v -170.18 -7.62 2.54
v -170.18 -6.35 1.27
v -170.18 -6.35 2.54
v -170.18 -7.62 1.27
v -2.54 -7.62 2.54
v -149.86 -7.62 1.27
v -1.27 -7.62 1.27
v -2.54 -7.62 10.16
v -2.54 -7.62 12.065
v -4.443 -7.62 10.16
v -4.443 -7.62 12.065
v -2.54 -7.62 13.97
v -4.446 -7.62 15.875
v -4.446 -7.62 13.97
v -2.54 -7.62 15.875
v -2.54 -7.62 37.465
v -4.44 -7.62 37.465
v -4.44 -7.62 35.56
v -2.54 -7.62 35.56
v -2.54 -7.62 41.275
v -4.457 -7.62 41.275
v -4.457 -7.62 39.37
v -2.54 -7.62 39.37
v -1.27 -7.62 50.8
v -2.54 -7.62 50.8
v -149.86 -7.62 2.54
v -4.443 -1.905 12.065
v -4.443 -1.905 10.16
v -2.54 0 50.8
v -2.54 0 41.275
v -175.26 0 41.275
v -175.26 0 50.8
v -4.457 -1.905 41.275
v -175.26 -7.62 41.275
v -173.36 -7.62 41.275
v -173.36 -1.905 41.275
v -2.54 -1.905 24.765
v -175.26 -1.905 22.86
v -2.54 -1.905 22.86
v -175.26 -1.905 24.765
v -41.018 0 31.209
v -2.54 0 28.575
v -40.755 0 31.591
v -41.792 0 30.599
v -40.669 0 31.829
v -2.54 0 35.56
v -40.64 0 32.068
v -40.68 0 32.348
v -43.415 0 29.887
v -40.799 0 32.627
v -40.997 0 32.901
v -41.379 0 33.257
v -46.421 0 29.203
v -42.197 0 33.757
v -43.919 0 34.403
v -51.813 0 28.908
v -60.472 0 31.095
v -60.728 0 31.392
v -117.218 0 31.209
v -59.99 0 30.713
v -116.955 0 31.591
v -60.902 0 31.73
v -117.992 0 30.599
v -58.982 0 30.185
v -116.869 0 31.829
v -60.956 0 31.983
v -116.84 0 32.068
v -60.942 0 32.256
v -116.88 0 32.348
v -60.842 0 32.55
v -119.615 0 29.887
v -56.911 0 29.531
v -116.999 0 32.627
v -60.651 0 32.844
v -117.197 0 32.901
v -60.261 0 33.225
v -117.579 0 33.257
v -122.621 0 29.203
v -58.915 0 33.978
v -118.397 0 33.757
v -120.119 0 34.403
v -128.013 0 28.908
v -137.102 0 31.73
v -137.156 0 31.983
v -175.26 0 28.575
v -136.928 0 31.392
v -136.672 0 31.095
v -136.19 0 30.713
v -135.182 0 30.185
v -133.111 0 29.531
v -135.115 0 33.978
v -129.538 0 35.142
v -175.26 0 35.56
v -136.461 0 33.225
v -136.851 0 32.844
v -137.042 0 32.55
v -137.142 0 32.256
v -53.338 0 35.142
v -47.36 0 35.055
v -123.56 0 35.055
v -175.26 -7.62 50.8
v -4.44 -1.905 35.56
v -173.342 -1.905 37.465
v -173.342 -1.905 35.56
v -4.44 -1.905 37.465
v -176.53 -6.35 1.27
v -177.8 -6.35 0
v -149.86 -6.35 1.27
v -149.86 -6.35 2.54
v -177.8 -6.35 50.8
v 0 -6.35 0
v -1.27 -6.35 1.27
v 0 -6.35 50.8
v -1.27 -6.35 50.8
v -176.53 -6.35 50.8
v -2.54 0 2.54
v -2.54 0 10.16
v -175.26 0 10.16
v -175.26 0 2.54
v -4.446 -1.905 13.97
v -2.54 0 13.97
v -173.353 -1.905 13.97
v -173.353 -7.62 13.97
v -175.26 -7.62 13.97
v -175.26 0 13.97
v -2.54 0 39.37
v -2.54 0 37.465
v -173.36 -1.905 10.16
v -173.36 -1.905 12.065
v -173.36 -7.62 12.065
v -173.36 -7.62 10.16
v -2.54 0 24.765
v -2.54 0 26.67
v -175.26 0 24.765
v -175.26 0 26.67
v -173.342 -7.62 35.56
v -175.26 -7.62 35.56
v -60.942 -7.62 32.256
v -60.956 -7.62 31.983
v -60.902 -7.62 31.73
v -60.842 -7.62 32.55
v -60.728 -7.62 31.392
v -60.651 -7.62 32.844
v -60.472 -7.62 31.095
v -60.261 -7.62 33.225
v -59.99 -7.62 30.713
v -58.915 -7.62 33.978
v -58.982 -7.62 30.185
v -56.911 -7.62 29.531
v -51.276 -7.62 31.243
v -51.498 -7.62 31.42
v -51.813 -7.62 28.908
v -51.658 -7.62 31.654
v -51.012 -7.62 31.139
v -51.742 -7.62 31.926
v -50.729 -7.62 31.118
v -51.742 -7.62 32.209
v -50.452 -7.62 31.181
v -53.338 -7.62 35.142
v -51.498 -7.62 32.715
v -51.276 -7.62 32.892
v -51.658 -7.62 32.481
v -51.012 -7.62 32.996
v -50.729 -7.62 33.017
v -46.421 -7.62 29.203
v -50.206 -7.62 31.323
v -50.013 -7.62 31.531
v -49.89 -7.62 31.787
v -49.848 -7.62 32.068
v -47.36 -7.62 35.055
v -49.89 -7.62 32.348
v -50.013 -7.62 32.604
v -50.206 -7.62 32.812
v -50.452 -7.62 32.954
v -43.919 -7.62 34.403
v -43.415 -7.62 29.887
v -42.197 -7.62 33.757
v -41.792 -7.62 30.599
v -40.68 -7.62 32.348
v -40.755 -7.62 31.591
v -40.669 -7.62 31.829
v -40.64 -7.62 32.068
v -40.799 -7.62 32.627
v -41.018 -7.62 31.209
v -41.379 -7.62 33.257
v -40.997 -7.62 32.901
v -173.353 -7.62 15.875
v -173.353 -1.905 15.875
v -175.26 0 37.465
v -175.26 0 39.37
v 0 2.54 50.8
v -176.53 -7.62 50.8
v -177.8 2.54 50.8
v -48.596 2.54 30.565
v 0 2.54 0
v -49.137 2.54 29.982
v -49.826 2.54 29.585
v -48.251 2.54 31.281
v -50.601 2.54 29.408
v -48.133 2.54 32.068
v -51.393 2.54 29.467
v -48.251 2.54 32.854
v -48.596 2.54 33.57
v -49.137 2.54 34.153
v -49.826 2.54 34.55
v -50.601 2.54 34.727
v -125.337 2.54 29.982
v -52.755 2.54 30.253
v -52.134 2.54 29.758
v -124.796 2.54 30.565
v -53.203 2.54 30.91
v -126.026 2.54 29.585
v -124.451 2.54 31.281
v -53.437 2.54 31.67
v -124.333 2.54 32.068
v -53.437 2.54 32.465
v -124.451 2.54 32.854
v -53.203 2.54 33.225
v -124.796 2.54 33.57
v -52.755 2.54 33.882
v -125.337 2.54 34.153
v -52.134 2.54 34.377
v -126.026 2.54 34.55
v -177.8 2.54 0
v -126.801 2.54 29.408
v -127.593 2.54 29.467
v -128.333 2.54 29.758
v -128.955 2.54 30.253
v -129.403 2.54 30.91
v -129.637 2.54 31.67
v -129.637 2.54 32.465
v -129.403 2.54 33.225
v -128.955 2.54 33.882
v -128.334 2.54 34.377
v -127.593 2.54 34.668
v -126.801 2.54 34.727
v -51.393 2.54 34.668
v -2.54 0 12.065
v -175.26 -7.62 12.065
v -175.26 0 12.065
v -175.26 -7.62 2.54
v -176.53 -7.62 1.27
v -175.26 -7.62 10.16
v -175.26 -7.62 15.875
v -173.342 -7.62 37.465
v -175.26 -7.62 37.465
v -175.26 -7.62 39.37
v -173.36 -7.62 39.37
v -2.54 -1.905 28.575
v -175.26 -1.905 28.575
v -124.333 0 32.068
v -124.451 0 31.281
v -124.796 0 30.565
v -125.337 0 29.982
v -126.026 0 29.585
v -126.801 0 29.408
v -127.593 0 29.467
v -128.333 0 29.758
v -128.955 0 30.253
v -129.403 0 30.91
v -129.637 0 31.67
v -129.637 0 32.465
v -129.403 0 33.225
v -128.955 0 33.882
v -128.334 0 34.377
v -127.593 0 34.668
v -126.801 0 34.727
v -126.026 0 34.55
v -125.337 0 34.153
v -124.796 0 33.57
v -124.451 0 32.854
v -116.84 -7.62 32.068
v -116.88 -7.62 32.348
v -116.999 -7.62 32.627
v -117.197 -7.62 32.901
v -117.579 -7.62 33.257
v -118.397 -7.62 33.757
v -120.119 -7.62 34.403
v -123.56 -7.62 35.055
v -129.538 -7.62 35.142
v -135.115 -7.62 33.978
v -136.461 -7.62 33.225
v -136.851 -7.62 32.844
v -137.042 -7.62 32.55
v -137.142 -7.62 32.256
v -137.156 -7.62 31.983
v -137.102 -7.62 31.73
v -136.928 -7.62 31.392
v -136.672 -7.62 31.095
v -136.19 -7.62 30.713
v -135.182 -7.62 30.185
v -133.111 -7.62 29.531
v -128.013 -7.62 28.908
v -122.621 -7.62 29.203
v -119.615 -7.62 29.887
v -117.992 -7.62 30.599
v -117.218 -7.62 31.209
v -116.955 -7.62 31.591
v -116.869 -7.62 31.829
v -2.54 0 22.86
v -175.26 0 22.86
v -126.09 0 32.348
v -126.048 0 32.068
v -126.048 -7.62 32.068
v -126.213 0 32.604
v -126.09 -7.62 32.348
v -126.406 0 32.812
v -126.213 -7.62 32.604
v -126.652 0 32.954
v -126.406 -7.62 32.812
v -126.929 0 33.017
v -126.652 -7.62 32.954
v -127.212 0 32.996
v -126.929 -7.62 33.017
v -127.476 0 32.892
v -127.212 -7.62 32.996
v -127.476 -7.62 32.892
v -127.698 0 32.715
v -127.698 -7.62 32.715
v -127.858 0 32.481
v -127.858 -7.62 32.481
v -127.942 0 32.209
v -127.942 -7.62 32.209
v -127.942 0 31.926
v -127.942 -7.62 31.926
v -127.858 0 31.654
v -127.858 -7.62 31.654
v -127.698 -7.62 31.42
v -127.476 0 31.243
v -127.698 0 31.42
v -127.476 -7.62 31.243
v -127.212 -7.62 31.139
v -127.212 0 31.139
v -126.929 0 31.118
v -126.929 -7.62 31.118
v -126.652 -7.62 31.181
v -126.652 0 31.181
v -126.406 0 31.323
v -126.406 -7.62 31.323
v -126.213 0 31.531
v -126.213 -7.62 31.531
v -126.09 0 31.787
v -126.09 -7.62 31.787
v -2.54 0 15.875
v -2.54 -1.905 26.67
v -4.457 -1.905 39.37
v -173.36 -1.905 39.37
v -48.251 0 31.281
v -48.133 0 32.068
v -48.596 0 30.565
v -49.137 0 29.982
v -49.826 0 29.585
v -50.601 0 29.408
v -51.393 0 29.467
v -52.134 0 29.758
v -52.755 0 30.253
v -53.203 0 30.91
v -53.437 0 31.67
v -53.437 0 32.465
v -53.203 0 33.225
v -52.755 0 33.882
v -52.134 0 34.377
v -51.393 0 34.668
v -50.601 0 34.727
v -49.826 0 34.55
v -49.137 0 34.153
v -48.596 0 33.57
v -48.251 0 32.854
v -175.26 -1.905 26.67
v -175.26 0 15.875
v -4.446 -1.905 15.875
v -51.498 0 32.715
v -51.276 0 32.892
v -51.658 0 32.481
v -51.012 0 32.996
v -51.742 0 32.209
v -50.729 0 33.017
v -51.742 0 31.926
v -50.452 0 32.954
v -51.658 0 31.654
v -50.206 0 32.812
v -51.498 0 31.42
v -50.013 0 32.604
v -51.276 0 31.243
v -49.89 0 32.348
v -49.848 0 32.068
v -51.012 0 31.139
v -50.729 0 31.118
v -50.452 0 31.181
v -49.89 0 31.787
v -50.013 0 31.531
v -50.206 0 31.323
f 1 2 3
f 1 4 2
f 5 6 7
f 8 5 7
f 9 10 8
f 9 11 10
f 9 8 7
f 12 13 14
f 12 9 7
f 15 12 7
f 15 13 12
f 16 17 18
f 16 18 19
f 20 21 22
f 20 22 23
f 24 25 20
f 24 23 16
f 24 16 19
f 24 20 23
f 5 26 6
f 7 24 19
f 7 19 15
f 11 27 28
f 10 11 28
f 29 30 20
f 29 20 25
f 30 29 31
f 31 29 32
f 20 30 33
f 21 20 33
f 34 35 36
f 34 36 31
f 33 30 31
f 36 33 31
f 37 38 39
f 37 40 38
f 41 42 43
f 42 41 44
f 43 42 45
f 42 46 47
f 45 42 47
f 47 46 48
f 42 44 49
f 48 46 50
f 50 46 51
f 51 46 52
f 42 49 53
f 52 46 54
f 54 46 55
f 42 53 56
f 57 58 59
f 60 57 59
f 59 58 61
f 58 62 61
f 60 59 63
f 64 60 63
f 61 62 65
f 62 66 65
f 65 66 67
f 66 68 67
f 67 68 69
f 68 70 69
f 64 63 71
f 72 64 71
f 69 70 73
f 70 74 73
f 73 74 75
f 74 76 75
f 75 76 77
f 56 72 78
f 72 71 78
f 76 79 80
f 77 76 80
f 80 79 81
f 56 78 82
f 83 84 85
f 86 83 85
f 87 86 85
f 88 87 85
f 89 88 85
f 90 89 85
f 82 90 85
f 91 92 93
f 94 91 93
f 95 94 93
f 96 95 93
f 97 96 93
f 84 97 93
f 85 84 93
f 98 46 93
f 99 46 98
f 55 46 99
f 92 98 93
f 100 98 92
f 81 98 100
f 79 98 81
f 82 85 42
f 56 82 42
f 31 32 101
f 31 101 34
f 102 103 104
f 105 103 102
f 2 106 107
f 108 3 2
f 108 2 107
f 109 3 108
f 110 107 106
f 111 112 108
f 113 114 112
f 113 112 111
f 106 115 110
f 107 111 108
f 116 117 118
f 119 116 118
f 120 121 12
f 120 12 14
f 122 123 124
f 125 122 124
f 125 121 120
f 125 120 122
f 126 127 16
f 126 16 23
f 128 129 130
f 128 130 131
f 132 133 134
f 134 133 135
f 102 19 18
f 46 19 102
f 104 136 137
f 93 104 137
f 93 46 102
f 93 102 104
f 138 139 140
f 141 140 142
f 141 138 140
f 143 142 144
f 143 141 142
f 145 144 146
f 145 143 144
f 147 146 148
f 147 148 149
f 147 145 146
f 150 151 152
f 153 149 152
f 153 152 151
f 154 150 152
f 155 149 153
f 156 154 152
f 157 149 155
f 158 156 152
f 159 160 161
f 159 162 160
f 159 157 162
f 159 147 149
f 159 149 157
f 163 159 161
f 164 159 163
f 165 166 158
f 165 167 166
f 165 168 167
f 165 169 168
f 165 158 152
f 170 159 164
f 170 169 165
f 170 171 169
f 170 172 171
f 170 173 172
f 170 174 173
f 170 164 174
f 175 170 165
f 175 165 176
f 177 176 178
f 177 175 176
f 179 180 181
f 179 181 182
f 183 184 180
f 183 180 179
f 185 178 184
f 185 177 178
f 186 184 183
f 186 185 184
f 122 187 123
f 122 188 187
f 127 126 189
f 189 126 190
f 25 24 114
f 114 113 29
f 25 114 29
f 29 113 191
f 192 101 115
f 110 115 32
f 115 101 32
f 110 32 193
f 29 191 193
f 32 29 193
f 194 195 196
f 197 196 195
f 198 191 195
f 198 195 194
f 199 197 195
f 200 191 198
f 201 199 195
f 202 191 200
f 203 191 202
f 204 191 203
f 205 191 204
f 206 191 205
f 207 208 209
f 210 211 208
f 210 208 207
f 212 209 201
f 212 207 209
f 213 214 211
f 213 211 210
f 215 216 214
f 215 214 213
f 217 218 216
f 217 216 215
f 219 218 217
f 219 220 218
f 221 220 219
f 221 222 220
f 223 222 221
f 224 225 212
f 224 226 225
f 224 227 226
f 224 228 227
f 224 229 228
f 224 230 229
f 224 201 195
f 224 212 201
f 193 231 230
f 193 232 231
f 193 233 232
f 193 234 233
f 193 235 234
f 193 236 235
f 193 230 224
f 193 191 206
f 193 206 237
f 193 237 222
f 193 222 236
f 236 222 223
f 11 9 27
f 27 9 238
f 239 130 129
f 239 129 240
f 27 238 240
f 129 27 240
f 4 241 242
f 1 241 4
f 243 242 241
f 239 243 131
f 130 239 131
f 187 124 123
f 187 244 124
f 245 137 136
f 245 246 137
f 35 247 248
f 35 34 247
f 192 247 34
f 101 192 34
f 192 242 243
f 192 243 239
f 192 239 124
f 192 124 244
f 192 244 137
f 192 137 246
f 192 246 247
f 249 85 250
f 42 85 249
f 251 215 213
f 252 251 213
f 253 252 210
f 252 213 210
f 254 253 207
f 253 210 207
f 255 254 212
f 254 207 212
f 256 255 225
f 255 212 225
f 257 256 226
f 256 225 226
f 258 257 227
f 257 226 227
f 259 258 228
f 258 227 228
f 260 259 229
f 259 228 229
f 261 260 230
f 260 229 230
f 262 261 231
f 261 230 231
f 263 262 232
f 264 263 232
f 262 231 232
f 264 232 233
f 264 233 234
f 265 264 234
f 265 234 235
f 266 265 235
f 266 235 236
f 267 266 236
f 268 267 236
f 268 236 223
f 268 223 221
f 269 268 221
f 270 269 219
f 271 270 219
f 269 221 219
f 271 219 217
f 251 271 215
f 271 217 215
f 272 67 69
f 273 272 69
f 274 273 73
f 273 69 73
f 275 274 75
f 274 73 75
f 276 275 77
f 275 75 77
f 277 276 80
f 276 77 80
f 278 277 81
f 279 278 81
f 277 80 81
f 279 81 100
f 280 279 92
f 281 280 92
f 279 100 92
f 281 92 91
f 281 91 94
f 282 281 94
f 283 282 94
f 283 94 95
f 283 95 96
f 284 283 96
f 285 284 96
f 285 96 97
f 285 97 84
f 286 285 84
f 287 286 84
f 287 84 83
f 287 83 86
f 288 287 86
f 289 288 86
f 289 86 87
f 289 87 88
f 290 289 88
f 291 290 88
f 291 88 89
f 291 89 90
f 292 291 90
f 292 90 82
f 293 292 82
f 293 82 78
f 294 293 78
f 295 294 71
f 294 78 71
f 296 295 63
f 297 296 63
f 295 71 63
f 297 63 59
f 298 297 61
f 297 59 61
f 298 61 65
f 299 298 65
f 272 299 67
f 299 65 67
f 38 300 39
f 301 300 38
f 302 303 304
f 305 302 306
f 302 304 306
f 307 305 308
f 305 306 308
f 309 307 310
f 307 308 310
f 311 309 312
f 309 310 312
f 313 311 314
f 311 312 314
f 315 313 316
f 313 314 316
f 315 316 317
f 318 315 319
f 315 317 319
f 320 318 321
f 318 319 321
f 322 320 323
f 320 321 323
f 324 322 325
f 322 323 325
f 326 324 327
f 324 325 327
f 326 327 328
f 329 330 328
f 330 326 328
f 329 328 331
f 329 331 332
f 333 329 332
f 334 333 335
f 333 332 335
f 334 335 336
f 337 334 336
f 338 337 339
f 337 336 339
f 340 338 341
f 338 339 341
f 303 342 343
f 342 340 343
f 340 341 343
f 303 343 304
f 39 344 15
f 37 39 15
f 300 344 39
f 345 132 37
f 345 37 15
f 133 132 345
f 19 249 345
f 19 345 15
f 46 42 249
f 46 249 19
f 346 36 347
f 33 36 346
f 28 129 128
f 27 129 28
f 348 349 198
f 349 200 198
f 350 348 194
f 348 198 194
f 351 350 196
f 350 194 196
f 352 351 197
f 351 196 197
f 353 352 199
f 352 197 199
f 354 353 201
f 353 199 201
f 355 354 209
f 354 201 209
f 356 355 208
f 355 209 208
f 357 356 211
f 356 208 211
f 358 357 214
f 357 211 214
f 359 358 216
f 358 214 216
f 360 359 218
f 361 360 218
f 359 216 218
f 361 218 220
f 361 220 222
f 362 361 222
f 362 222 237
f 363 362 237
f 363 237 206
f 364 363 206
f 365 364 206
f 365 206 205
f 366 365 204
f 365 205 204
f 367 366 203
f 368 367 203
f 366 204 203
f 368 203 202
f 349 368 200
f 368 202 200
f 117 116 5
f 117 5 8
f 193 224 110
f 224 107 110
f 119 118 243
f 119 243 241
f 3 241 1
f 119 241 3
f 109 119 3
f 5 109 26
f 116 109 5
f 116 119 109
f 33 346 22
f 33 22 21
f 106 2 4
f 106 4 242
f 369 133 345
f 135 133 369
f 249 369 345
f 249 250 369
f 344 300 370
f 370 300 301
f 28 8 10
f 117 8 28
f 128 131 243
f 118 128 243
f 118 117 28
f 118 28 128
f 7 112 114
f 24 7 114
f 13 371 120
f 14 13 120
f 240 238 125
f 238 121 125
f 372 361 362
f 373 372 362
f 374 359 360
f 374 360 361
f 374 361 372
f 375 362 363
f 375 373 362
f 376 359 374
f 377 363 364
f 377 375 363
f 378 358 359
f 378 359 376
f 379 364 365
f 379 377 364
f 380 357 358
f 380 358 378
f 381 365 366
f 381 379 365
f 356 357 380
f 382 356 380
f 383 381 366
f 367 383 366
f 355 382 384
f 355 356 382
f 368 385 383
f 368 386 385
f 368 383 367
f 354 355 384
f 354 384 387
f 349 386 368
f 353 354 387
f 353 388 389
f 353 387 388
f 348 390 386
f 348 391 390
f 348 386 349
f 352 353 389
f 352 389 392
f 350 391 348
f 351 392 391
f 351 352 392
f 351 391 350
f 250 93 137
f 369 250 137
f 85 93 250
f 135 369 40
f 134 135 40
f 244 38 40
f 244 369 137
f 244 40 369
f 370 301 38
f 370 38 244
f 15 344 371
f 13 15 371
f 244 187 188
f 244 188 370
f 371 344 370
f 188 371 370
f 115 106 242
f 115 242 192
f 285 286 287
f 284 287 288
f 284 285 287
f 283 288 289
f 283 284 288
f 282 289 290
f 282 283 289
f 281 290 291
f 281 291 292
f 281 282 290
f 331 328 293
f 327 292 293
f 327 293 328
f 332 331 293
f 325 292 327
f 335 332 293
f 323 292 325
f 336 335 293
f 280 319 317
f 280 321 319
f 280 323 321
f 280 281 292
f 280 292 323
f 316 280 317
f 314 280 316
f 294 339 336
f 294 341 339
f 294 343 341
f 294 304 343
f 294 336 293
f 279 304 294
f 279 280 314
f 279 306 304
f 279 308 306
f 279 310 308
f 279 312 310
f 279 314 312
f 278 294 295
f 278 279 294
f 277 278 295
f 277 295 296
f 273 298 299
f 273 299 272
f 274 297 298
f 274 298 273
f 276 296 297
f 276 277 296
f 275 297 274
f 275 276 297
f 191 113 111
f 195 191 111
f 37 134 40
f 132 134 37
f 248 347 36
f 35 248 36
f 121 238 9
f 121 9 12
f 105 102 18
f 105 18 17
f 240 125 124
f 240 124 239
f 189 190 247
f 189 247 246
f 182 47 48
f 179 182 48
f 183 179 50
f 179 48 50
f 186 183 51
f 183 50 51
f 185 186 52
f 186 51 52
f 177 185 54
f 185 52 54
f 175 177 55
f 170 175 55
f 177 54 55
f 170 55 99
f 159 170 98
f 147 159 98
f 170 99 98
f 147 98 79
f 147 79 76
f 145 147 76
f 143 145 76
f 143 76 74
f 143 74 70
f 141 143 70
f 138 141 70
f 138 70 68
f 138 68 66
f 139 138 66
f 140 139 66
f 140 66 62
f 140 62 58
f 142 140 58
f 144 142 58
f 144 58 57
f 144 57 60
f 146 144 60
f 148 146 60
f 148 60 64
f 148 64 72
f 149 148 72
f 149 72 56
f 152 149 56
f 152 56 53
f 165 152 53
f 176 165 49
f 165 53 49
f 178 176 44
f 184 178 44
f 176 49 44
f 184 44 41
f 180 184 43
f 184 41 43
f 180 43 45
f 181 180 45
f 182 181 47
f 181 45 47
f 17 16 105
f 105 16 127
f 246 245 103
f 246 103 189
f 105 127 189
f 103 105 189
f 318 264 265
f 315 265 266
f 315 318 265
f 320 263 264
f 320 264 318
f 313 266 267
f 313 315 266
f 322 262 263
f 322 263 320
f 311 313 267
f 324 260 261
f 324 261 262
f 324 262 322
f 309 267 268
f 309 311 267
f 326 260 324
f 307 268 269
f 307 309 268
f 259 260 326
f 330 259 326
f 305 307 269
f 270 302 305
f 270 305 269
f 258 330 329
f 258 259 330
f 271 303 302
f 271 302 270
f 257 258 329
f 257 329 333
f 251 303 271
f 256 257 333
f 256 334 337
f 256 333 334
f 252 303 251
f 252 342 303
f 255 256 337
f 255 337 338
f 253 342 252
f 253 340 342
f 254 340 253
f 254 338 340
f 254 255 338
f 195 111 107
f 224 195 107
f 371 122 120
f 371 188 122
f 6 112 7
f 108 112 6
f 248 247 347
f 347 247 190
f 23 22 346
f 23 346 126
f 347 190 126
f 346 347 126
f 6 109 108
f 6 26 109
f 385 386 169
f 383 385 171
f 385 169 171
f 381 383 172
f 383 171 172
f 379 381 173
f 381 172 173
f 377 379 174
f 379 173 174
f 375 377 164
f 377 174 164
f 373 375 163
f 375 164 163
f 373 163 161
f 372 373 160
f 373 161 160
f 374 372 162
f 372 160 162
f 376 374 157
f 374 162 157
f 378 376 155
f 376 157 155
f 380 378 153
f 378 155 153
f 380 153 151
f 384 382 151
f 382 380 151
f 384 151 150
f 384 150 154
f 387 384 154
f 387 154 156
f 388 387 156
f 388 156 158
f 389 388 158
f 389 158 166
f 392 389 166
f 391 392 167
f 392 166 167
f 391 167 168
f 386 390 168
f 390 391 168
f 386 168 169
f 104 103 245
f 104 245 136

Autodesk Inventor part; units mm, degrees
ref_plane "YZ Plane" through (0, 0, 0) normal (1, 0, 0) x (0, 1, 0)
ref_plane "XZ Plane" through (0, 0, 0) normal (0, 1, 0) x (-1, 0, 0)
ref_plane "XY Plane" through (0, 0, 0) normal (0, 0, 1) x (1, 0, 0)
sketch "Náčrt1" plane through (0, 0, 0) normal (0, 1, 0) x (-1, 0, 0)
  line L0 (0, 0) -> (177.8, 0)
  line L1 (177.8, 0) -> (177.8, 50.8)
  line L2 (177.8, 50.8) -> (0, 50.8)
  line L3 (0, 50.8) -> (0, 0)
  dimension "d0" = 50.8
  dimension "d1" = 177.8
extrude "Vysunutí1" add sketch "Náčrt1" along normal blind 2.54
sketch "Náčrt3" plane through (0, 0, 0) normal (0, -1, 0) x (1, 0, 0)
  line L0 (0, 0) -> (-177.8, 0) projected
  line L1 (-177.8, 50.8) -> (0, 50.8) projected
  line L2 (-177.8, 50.8) -> (-175.26, 50.8)
  line L3 (-175.26, 50.8) -> (-175.26, 2.54)
  line L4 (-175.26, 2.54) -> (-2.54, 2.54)
  line L5 (-2.54, 2.54) -> (-2.54, 50.8)
  line L6 (-2.54, 50.8) -> (0, 50.8)
  line L7 (0, 50.8) -> (0, 0)
  line L8 (0, 0) -> (-177.8, 0)
  line L9 (-177.8, 0) -> (-177.8, 50.8)
  line L10 (0, 0) -> (-177.8, 0) projected
  line L11 (-177.8, 50.8) -> (-175.26, 50.8)
  dimension "d23" = 2.54
  dimension "d24" = 2.54
  dimension "d25" = 2.54
extrude "Vysunutí2" add sketch "Náčrt3" along normal blind 6.35 contours L0 L9 L1 L3 L4 L5 L7
sketch "Náčrt4" plane through (0, -6.35, 0) normal (0, -1, 0) x (1, 0, 0)
  line L0 (0, 50.8) -> (-2.54, 50.8) projected
  line L1 (-2.54, 50.8) -> (-1.27, 50.8)
  line L2 (-1.27, 1.27) -> (-176.53, 1.27)
  line L3 (-176.53, 1.27) -> (-176.53, 50.8)
  line L4 (-176.53, 50.8) -> (-175.26, 50.8)
  line L5 (-175.26, 50.8) -> (-175.26, 2.54)
  line L6 (-175.26, 2.54) -> (-2.54, 2.54)
  line L7 (-2.54, 2.54) -> (-2.54, 50.8)
  line L8 (-1.27, 1.27) -> (-1.27, 50.8)
  line L9 (-177.8, 0) -> (0, 0) projected
  line L10 (-177.8, 50.8) -> (-177.8, 0) projected
  dimension "d26" = 1.27
  dimension "d27" = 1.27
extrude "Vysunutí3" add sketch "Náčrt4" along normal blind 1.27
sketch "Náčrt5" plane through (0, 0, 0) normal (0, -1, 0) x (1, 0, 0)
  line L0 (-2.54, 2.54) -> (-2.54, 50.8) projected
  line L1 (-175.26, 50.8) -> (-2.54, 50.8) projected
  line L2 (-175.26, 50.8) -> (-175.26, 2.54) projected
  line L3 (-175.26, 41.275) -> (-2.54, 41.275)
  line L4 (-2.54, 41.275) -> (-2.54, 39.37)
  line L5 (-2.54, 39.37) -> (-175.26, 39.37)
  line L6 (-175.26, 39.37) -> (-175.26, 41.275)
  line L7 (-175.26, 2.54) -> (-175.26, 50.8) projected
  line L8 (-175.26, 37.465) -> (-2.54, 37.465)
  line L9 (-2.54, 37.465) -> (-2.54, 35.56)
  line L10 (-2.54, 35.56) -> (-175.26, 35.56)
  line L11 (-175.26, 35.56) -> (-175.26, 37.465)
  line L12 (-175.26, 28.575) -> (-2.54, 28.575)
  line L13 (-2.54, 28.575) -> (-2.54, 26.67)
  line L14 (-2.54, 26.67) -> (-175.26, 26.67)
  line L15 (-175.26, 26.67) -> (-175.26, 28.575)
  line L16 (-175.26, 24.765) -> (-2.54, 24.765)
  line L17 (-2.54, 24.765) -> (-2.54, 22.86)
  line L18 (-2.54, 22.86) -> (-175.26, 22.86)
  line L19 (-175.26, 22.86) -> (-175.26, 24.765)
  line L20 (-175.26, 15.875) -> (-2.54, 15.875)
  line L21 (-2.54, 15.875) -> (-2.54, 13.97)
  line L22 (-2.54, 13.97) -> (-175.26, 13.97)
  line L23 (-175.26, 13.97) -> (-175.26, 15.875)
  line L24 (-175.26, 12.065) -> (-2.54, 12.065)
  line L25 (-2.54, 12.065) -> (-2.54, 10.16)
  line L26 (-2.54, 10.16) -> (-175.26, 10.16)
  line L27 (-175.26, 10.16) -> (-175.26, 12.065)
  point P0 (0, 0)
  dimension "d8" = 1.905
  dimension "d10" = 1.905
  dimension "d11" = 1.905
  dimension "d12" = 1.905
  dimension "d13" = 1.905
  dimension "d14" = 1.905
  dimension "d15" = 1.905
  dimension "d16" = 1.905
  dimension "d17" = 1.905
  dimension "d18" = 11.43
  dimension "d19" = 10.795
  dimension "d20" = 10.795
extrude "Vysunutí4" add sketch "Náčrt5" along normal blind 1.905 contours L26 L2 L24 L0 | L22 L2 L20 L0 | L18 L2 L16 L0 | L14 L2 L12 L0 | L10 L2 L8 L0 | L5 L2 L3 L0
sketch "Náčrt6" plane through (0, -1.905, 0) normal (0, -1, 0) x (1, 0, 0)
  line L0 (-2.54, 41.275) -> (-175.26, 41.275) projected
  line L1 (-175.26, 39.37) -> (-173.3599, 39.37)
  line L2 (-173.3599, 39.37) -> (-173.3599, 41.275)
  line L3 (-173.3599, 41.275) -> (-175.26, 41.275)
  line L4 (-175.26, 41.275) -> (-175.26, 39.37)
  line L5 (-2.54, 39.37) -> (-4.4571, 39.37)
  line L6 (-4.4571, 39.37) -> (-4.4571, 41.275)
  line L7 (-4.4571, 41.275) -> (-2.54, 41.275)
  line L8 (-2.54, 41.275) -> (-2.54, 39.37)
  point P0 (0, 0)
extrude "Vysunutí5" add sketch "Náčrt6" along normal up to surface (5.715 mm away)
sketch "Náčrt7" plane through (0, -1.905, 0) normal (0, -1, 0) x (1, 0, 0)
  line L0 (-175.26, 35.56) -> (-175.26, 37.465) projected
  line L1 (-175.26, 35.56) -> (-2.54, 35.56) projected
  line L2 (-2.54, 37.465) -> (-175.26, 37.465) projected
  line L3 (-175.26, 37.465) -> (-173.3424, 37.465)
  line L4 (-173.3424, 37.465) -> (-173.3424, 35.56)
  line L5 (-173.3424, 35.56) -> (-175.26, 35.56)
  line L6 (-175.26, 35.56) -> (-175.26, 37.465)
  line L7 (-2.54, 35.56) -> (-4.4396, 35.56)
  line L8 (-4.4396, 35.56) -> (-4.4396, 37.465)
  line L9 (-4.4396, 37.465) -> (-2.54, 37.465)
  line L10 (-2.54, 37.465) -> (-2.54, 35.56)
  point P0 (0, 0)
extrude "Vysunutí6" add sketch "Náčrt7" along normal up to surface (5.715 mm away) contours L0 L2 L4 L1 | L8 L2 L10 L1
sketch "Náčrt10" plane through (0, -1.905, 0) normal (0, -1, 0) x (1, 0, 0)
  line L0 (-2.54, 13.97) -> (-175.26, 13.97) projected
  line L1 (-175.26, 15.875) -> (-173.3527, 15.875)
  line L2 (-173.3527, 15.875) -> (-173.3527, 13.97)
  line L3 (-173.3527, 13.97) -> (-175.26, 13.97)
  line L4 (-175.26, 13.97) -> (-175.26, 15.875)
  line L5 (-2.54, 15.875) -> (-4.4457, 15.875)
  line L6 (-4.4457, 15.875) -> (-4.4457, 13.97)
  line L7 (-4.4457, 13.97) -> (-2.54, 13.97)
  line L8 (-2.54, 13.97) -> (-2.54, 15.875)
  point P0 (0, 0)
extrude "Vysunutí9" add sketch "Náčrt10" along normal up to surface (5.715 mm away)
sketch "Náčrt11" plane through (0, -1.905, 0) normal (0, -1, 0) x (1, 0, 0)
  line L0 (-175.26, 10.16) -> (-2.54, 10.16) projected
  line L1 (-175.26, 12.065) -> (-173.3599, 12.065)
  line L2 (-173.3599, 12.065) -> (-173.3599, 10.16)
  line L3 (-173.3599, 10.16) -> (-175.26, 10.16)
  line L4 (-175.26, 10.16) -> (-175.26, 12.065)
  line L5 (-2.54, 12.065) -> (-4.4431, 12.065)
  line L6 (-4.4431, 12.065) -> (-4.4431, 10.16)
  line L7 (-4.4431, 10.16) -> (-2.54, 10.16)
  line L8 (-2.54, 10.16) -> (-2.54, 12.065)
  point P0 (0, 0)
extrude "Vysunutí10" add sketch "Náčrt11" along normal up to surface (5.715 mm away)
sketch "Náčrt12" plane through (0, 0, 0) normal (0, -1, 0) x (1, 0, 0)
  line L0 (-2.54, 35.56) -> (-175.26, 35.56) projected
  line L1 (-175.26, 35.56) -> (-175.26, 28.575) projected
  ellipse E0 centre (-127, 32.0675) end of major axis (-116.84, 32.0675) minor radius 3.175
  line L2 (-175.26, 50.8) -> (-2.54, 50.8) projected
  ellipse E1 centre (-50.8, 32.0675) end of major axis (-40.64, 32.0675) minor radius 3.175
  point P0 (0, 0)
  dimension "d42" = 10.16
  dimension "d43" = 3.175
  dimension "d45" = 10.16
  dimension "d46" = 3.175
  dimension "d40" = 48.26
  dimension "d41" = 18.7325
  dimension "d44" = 76.2
  dimension "d47" = 0
extrude "Vysunutí11" add sketch "Náčrt12" along normal up to surface (7.62 mm away)
sketch "Náčrt13" plane through (-127, -7.62, 32.0675) normal (0, -1, 0) x (1, 0, 0)
  ellipse E0 centre (0, 0) end of major axis (-10.16, 0) minor radius 3.175 projected
  circle A0 centre (0, 0) radius 0.9525
  point P0 (127, -32.0675)
  dimension "d50" = 1.905
extrude "Vysunutí12" cut sketch "Náčrt13" against normal through all contours A0
sketch "Náčrt14" plane through (-50.8, -7.62, 32.0675) normal (0, -1, 0) x (1, 0, 0)
  ellipse E0 centre (0, 0) end of major axis (-10.16, 0) minor radius 3.175 projected
  circle A0 centre (0, 0) radius 0.9525
  point P0 (50.8, -32.0675)
  dimension "d53" = 1.905
extrude "Vysunutí13" cut sketch "Náčrt14" against normal through all contours A0
sketch "Náčrt15" plane through (0, 2.54, 0) normal (0, 1, 0) x (1, 0, 0)
  circle A0 centre (-50.8, -32.0675) radius 0.9525 projected
  circle A1 centre (-127, -32.0675) radius 0.9525 projected
  circle A2 centre (-127, -32.0675) radius 2.667
  circle A3 centre (-50.8, -32.0675) radius 2.667
  dimension "d56" = 5.334
  dimension "d57" = 5.334
extrude "Vysunutí14" cut sketch "Náčrt15" against normal blind 2.54
sketch "Náčrt16" plane through (0, -7.62, 0) normal (0, -1, 0) x (1, 0, 0)
  line L0 (-2.54, 2.54) -> (-175.26, 2.54) projected
  line L1 (-175.26, 2.54) -> (-175.26, 10.16) projected
  line L2 (-176.53, 1.27) -> (-1.27, 1.27) projected
  line L3 (-170.18, 2.54) -> (-149.86, 2.54)
  line L4 (-149.86, 2.54) -> (-149.86, 1.27)
  line L5 (-149.86, 1.27) -> (-170.18, 1.27)
  line L6 (-170.18, 1.27) -> (-170.18, 2.54)
  point P0 (0, 0)
  dimension "d60" = 20.32
  dimension "d61" = 25.4
extrude "Vysunutí15" cut sketch "Náčrt16" against normal up to surface (1.27 mm away)
properties part number "NavCom_Box_Upper_Part"
